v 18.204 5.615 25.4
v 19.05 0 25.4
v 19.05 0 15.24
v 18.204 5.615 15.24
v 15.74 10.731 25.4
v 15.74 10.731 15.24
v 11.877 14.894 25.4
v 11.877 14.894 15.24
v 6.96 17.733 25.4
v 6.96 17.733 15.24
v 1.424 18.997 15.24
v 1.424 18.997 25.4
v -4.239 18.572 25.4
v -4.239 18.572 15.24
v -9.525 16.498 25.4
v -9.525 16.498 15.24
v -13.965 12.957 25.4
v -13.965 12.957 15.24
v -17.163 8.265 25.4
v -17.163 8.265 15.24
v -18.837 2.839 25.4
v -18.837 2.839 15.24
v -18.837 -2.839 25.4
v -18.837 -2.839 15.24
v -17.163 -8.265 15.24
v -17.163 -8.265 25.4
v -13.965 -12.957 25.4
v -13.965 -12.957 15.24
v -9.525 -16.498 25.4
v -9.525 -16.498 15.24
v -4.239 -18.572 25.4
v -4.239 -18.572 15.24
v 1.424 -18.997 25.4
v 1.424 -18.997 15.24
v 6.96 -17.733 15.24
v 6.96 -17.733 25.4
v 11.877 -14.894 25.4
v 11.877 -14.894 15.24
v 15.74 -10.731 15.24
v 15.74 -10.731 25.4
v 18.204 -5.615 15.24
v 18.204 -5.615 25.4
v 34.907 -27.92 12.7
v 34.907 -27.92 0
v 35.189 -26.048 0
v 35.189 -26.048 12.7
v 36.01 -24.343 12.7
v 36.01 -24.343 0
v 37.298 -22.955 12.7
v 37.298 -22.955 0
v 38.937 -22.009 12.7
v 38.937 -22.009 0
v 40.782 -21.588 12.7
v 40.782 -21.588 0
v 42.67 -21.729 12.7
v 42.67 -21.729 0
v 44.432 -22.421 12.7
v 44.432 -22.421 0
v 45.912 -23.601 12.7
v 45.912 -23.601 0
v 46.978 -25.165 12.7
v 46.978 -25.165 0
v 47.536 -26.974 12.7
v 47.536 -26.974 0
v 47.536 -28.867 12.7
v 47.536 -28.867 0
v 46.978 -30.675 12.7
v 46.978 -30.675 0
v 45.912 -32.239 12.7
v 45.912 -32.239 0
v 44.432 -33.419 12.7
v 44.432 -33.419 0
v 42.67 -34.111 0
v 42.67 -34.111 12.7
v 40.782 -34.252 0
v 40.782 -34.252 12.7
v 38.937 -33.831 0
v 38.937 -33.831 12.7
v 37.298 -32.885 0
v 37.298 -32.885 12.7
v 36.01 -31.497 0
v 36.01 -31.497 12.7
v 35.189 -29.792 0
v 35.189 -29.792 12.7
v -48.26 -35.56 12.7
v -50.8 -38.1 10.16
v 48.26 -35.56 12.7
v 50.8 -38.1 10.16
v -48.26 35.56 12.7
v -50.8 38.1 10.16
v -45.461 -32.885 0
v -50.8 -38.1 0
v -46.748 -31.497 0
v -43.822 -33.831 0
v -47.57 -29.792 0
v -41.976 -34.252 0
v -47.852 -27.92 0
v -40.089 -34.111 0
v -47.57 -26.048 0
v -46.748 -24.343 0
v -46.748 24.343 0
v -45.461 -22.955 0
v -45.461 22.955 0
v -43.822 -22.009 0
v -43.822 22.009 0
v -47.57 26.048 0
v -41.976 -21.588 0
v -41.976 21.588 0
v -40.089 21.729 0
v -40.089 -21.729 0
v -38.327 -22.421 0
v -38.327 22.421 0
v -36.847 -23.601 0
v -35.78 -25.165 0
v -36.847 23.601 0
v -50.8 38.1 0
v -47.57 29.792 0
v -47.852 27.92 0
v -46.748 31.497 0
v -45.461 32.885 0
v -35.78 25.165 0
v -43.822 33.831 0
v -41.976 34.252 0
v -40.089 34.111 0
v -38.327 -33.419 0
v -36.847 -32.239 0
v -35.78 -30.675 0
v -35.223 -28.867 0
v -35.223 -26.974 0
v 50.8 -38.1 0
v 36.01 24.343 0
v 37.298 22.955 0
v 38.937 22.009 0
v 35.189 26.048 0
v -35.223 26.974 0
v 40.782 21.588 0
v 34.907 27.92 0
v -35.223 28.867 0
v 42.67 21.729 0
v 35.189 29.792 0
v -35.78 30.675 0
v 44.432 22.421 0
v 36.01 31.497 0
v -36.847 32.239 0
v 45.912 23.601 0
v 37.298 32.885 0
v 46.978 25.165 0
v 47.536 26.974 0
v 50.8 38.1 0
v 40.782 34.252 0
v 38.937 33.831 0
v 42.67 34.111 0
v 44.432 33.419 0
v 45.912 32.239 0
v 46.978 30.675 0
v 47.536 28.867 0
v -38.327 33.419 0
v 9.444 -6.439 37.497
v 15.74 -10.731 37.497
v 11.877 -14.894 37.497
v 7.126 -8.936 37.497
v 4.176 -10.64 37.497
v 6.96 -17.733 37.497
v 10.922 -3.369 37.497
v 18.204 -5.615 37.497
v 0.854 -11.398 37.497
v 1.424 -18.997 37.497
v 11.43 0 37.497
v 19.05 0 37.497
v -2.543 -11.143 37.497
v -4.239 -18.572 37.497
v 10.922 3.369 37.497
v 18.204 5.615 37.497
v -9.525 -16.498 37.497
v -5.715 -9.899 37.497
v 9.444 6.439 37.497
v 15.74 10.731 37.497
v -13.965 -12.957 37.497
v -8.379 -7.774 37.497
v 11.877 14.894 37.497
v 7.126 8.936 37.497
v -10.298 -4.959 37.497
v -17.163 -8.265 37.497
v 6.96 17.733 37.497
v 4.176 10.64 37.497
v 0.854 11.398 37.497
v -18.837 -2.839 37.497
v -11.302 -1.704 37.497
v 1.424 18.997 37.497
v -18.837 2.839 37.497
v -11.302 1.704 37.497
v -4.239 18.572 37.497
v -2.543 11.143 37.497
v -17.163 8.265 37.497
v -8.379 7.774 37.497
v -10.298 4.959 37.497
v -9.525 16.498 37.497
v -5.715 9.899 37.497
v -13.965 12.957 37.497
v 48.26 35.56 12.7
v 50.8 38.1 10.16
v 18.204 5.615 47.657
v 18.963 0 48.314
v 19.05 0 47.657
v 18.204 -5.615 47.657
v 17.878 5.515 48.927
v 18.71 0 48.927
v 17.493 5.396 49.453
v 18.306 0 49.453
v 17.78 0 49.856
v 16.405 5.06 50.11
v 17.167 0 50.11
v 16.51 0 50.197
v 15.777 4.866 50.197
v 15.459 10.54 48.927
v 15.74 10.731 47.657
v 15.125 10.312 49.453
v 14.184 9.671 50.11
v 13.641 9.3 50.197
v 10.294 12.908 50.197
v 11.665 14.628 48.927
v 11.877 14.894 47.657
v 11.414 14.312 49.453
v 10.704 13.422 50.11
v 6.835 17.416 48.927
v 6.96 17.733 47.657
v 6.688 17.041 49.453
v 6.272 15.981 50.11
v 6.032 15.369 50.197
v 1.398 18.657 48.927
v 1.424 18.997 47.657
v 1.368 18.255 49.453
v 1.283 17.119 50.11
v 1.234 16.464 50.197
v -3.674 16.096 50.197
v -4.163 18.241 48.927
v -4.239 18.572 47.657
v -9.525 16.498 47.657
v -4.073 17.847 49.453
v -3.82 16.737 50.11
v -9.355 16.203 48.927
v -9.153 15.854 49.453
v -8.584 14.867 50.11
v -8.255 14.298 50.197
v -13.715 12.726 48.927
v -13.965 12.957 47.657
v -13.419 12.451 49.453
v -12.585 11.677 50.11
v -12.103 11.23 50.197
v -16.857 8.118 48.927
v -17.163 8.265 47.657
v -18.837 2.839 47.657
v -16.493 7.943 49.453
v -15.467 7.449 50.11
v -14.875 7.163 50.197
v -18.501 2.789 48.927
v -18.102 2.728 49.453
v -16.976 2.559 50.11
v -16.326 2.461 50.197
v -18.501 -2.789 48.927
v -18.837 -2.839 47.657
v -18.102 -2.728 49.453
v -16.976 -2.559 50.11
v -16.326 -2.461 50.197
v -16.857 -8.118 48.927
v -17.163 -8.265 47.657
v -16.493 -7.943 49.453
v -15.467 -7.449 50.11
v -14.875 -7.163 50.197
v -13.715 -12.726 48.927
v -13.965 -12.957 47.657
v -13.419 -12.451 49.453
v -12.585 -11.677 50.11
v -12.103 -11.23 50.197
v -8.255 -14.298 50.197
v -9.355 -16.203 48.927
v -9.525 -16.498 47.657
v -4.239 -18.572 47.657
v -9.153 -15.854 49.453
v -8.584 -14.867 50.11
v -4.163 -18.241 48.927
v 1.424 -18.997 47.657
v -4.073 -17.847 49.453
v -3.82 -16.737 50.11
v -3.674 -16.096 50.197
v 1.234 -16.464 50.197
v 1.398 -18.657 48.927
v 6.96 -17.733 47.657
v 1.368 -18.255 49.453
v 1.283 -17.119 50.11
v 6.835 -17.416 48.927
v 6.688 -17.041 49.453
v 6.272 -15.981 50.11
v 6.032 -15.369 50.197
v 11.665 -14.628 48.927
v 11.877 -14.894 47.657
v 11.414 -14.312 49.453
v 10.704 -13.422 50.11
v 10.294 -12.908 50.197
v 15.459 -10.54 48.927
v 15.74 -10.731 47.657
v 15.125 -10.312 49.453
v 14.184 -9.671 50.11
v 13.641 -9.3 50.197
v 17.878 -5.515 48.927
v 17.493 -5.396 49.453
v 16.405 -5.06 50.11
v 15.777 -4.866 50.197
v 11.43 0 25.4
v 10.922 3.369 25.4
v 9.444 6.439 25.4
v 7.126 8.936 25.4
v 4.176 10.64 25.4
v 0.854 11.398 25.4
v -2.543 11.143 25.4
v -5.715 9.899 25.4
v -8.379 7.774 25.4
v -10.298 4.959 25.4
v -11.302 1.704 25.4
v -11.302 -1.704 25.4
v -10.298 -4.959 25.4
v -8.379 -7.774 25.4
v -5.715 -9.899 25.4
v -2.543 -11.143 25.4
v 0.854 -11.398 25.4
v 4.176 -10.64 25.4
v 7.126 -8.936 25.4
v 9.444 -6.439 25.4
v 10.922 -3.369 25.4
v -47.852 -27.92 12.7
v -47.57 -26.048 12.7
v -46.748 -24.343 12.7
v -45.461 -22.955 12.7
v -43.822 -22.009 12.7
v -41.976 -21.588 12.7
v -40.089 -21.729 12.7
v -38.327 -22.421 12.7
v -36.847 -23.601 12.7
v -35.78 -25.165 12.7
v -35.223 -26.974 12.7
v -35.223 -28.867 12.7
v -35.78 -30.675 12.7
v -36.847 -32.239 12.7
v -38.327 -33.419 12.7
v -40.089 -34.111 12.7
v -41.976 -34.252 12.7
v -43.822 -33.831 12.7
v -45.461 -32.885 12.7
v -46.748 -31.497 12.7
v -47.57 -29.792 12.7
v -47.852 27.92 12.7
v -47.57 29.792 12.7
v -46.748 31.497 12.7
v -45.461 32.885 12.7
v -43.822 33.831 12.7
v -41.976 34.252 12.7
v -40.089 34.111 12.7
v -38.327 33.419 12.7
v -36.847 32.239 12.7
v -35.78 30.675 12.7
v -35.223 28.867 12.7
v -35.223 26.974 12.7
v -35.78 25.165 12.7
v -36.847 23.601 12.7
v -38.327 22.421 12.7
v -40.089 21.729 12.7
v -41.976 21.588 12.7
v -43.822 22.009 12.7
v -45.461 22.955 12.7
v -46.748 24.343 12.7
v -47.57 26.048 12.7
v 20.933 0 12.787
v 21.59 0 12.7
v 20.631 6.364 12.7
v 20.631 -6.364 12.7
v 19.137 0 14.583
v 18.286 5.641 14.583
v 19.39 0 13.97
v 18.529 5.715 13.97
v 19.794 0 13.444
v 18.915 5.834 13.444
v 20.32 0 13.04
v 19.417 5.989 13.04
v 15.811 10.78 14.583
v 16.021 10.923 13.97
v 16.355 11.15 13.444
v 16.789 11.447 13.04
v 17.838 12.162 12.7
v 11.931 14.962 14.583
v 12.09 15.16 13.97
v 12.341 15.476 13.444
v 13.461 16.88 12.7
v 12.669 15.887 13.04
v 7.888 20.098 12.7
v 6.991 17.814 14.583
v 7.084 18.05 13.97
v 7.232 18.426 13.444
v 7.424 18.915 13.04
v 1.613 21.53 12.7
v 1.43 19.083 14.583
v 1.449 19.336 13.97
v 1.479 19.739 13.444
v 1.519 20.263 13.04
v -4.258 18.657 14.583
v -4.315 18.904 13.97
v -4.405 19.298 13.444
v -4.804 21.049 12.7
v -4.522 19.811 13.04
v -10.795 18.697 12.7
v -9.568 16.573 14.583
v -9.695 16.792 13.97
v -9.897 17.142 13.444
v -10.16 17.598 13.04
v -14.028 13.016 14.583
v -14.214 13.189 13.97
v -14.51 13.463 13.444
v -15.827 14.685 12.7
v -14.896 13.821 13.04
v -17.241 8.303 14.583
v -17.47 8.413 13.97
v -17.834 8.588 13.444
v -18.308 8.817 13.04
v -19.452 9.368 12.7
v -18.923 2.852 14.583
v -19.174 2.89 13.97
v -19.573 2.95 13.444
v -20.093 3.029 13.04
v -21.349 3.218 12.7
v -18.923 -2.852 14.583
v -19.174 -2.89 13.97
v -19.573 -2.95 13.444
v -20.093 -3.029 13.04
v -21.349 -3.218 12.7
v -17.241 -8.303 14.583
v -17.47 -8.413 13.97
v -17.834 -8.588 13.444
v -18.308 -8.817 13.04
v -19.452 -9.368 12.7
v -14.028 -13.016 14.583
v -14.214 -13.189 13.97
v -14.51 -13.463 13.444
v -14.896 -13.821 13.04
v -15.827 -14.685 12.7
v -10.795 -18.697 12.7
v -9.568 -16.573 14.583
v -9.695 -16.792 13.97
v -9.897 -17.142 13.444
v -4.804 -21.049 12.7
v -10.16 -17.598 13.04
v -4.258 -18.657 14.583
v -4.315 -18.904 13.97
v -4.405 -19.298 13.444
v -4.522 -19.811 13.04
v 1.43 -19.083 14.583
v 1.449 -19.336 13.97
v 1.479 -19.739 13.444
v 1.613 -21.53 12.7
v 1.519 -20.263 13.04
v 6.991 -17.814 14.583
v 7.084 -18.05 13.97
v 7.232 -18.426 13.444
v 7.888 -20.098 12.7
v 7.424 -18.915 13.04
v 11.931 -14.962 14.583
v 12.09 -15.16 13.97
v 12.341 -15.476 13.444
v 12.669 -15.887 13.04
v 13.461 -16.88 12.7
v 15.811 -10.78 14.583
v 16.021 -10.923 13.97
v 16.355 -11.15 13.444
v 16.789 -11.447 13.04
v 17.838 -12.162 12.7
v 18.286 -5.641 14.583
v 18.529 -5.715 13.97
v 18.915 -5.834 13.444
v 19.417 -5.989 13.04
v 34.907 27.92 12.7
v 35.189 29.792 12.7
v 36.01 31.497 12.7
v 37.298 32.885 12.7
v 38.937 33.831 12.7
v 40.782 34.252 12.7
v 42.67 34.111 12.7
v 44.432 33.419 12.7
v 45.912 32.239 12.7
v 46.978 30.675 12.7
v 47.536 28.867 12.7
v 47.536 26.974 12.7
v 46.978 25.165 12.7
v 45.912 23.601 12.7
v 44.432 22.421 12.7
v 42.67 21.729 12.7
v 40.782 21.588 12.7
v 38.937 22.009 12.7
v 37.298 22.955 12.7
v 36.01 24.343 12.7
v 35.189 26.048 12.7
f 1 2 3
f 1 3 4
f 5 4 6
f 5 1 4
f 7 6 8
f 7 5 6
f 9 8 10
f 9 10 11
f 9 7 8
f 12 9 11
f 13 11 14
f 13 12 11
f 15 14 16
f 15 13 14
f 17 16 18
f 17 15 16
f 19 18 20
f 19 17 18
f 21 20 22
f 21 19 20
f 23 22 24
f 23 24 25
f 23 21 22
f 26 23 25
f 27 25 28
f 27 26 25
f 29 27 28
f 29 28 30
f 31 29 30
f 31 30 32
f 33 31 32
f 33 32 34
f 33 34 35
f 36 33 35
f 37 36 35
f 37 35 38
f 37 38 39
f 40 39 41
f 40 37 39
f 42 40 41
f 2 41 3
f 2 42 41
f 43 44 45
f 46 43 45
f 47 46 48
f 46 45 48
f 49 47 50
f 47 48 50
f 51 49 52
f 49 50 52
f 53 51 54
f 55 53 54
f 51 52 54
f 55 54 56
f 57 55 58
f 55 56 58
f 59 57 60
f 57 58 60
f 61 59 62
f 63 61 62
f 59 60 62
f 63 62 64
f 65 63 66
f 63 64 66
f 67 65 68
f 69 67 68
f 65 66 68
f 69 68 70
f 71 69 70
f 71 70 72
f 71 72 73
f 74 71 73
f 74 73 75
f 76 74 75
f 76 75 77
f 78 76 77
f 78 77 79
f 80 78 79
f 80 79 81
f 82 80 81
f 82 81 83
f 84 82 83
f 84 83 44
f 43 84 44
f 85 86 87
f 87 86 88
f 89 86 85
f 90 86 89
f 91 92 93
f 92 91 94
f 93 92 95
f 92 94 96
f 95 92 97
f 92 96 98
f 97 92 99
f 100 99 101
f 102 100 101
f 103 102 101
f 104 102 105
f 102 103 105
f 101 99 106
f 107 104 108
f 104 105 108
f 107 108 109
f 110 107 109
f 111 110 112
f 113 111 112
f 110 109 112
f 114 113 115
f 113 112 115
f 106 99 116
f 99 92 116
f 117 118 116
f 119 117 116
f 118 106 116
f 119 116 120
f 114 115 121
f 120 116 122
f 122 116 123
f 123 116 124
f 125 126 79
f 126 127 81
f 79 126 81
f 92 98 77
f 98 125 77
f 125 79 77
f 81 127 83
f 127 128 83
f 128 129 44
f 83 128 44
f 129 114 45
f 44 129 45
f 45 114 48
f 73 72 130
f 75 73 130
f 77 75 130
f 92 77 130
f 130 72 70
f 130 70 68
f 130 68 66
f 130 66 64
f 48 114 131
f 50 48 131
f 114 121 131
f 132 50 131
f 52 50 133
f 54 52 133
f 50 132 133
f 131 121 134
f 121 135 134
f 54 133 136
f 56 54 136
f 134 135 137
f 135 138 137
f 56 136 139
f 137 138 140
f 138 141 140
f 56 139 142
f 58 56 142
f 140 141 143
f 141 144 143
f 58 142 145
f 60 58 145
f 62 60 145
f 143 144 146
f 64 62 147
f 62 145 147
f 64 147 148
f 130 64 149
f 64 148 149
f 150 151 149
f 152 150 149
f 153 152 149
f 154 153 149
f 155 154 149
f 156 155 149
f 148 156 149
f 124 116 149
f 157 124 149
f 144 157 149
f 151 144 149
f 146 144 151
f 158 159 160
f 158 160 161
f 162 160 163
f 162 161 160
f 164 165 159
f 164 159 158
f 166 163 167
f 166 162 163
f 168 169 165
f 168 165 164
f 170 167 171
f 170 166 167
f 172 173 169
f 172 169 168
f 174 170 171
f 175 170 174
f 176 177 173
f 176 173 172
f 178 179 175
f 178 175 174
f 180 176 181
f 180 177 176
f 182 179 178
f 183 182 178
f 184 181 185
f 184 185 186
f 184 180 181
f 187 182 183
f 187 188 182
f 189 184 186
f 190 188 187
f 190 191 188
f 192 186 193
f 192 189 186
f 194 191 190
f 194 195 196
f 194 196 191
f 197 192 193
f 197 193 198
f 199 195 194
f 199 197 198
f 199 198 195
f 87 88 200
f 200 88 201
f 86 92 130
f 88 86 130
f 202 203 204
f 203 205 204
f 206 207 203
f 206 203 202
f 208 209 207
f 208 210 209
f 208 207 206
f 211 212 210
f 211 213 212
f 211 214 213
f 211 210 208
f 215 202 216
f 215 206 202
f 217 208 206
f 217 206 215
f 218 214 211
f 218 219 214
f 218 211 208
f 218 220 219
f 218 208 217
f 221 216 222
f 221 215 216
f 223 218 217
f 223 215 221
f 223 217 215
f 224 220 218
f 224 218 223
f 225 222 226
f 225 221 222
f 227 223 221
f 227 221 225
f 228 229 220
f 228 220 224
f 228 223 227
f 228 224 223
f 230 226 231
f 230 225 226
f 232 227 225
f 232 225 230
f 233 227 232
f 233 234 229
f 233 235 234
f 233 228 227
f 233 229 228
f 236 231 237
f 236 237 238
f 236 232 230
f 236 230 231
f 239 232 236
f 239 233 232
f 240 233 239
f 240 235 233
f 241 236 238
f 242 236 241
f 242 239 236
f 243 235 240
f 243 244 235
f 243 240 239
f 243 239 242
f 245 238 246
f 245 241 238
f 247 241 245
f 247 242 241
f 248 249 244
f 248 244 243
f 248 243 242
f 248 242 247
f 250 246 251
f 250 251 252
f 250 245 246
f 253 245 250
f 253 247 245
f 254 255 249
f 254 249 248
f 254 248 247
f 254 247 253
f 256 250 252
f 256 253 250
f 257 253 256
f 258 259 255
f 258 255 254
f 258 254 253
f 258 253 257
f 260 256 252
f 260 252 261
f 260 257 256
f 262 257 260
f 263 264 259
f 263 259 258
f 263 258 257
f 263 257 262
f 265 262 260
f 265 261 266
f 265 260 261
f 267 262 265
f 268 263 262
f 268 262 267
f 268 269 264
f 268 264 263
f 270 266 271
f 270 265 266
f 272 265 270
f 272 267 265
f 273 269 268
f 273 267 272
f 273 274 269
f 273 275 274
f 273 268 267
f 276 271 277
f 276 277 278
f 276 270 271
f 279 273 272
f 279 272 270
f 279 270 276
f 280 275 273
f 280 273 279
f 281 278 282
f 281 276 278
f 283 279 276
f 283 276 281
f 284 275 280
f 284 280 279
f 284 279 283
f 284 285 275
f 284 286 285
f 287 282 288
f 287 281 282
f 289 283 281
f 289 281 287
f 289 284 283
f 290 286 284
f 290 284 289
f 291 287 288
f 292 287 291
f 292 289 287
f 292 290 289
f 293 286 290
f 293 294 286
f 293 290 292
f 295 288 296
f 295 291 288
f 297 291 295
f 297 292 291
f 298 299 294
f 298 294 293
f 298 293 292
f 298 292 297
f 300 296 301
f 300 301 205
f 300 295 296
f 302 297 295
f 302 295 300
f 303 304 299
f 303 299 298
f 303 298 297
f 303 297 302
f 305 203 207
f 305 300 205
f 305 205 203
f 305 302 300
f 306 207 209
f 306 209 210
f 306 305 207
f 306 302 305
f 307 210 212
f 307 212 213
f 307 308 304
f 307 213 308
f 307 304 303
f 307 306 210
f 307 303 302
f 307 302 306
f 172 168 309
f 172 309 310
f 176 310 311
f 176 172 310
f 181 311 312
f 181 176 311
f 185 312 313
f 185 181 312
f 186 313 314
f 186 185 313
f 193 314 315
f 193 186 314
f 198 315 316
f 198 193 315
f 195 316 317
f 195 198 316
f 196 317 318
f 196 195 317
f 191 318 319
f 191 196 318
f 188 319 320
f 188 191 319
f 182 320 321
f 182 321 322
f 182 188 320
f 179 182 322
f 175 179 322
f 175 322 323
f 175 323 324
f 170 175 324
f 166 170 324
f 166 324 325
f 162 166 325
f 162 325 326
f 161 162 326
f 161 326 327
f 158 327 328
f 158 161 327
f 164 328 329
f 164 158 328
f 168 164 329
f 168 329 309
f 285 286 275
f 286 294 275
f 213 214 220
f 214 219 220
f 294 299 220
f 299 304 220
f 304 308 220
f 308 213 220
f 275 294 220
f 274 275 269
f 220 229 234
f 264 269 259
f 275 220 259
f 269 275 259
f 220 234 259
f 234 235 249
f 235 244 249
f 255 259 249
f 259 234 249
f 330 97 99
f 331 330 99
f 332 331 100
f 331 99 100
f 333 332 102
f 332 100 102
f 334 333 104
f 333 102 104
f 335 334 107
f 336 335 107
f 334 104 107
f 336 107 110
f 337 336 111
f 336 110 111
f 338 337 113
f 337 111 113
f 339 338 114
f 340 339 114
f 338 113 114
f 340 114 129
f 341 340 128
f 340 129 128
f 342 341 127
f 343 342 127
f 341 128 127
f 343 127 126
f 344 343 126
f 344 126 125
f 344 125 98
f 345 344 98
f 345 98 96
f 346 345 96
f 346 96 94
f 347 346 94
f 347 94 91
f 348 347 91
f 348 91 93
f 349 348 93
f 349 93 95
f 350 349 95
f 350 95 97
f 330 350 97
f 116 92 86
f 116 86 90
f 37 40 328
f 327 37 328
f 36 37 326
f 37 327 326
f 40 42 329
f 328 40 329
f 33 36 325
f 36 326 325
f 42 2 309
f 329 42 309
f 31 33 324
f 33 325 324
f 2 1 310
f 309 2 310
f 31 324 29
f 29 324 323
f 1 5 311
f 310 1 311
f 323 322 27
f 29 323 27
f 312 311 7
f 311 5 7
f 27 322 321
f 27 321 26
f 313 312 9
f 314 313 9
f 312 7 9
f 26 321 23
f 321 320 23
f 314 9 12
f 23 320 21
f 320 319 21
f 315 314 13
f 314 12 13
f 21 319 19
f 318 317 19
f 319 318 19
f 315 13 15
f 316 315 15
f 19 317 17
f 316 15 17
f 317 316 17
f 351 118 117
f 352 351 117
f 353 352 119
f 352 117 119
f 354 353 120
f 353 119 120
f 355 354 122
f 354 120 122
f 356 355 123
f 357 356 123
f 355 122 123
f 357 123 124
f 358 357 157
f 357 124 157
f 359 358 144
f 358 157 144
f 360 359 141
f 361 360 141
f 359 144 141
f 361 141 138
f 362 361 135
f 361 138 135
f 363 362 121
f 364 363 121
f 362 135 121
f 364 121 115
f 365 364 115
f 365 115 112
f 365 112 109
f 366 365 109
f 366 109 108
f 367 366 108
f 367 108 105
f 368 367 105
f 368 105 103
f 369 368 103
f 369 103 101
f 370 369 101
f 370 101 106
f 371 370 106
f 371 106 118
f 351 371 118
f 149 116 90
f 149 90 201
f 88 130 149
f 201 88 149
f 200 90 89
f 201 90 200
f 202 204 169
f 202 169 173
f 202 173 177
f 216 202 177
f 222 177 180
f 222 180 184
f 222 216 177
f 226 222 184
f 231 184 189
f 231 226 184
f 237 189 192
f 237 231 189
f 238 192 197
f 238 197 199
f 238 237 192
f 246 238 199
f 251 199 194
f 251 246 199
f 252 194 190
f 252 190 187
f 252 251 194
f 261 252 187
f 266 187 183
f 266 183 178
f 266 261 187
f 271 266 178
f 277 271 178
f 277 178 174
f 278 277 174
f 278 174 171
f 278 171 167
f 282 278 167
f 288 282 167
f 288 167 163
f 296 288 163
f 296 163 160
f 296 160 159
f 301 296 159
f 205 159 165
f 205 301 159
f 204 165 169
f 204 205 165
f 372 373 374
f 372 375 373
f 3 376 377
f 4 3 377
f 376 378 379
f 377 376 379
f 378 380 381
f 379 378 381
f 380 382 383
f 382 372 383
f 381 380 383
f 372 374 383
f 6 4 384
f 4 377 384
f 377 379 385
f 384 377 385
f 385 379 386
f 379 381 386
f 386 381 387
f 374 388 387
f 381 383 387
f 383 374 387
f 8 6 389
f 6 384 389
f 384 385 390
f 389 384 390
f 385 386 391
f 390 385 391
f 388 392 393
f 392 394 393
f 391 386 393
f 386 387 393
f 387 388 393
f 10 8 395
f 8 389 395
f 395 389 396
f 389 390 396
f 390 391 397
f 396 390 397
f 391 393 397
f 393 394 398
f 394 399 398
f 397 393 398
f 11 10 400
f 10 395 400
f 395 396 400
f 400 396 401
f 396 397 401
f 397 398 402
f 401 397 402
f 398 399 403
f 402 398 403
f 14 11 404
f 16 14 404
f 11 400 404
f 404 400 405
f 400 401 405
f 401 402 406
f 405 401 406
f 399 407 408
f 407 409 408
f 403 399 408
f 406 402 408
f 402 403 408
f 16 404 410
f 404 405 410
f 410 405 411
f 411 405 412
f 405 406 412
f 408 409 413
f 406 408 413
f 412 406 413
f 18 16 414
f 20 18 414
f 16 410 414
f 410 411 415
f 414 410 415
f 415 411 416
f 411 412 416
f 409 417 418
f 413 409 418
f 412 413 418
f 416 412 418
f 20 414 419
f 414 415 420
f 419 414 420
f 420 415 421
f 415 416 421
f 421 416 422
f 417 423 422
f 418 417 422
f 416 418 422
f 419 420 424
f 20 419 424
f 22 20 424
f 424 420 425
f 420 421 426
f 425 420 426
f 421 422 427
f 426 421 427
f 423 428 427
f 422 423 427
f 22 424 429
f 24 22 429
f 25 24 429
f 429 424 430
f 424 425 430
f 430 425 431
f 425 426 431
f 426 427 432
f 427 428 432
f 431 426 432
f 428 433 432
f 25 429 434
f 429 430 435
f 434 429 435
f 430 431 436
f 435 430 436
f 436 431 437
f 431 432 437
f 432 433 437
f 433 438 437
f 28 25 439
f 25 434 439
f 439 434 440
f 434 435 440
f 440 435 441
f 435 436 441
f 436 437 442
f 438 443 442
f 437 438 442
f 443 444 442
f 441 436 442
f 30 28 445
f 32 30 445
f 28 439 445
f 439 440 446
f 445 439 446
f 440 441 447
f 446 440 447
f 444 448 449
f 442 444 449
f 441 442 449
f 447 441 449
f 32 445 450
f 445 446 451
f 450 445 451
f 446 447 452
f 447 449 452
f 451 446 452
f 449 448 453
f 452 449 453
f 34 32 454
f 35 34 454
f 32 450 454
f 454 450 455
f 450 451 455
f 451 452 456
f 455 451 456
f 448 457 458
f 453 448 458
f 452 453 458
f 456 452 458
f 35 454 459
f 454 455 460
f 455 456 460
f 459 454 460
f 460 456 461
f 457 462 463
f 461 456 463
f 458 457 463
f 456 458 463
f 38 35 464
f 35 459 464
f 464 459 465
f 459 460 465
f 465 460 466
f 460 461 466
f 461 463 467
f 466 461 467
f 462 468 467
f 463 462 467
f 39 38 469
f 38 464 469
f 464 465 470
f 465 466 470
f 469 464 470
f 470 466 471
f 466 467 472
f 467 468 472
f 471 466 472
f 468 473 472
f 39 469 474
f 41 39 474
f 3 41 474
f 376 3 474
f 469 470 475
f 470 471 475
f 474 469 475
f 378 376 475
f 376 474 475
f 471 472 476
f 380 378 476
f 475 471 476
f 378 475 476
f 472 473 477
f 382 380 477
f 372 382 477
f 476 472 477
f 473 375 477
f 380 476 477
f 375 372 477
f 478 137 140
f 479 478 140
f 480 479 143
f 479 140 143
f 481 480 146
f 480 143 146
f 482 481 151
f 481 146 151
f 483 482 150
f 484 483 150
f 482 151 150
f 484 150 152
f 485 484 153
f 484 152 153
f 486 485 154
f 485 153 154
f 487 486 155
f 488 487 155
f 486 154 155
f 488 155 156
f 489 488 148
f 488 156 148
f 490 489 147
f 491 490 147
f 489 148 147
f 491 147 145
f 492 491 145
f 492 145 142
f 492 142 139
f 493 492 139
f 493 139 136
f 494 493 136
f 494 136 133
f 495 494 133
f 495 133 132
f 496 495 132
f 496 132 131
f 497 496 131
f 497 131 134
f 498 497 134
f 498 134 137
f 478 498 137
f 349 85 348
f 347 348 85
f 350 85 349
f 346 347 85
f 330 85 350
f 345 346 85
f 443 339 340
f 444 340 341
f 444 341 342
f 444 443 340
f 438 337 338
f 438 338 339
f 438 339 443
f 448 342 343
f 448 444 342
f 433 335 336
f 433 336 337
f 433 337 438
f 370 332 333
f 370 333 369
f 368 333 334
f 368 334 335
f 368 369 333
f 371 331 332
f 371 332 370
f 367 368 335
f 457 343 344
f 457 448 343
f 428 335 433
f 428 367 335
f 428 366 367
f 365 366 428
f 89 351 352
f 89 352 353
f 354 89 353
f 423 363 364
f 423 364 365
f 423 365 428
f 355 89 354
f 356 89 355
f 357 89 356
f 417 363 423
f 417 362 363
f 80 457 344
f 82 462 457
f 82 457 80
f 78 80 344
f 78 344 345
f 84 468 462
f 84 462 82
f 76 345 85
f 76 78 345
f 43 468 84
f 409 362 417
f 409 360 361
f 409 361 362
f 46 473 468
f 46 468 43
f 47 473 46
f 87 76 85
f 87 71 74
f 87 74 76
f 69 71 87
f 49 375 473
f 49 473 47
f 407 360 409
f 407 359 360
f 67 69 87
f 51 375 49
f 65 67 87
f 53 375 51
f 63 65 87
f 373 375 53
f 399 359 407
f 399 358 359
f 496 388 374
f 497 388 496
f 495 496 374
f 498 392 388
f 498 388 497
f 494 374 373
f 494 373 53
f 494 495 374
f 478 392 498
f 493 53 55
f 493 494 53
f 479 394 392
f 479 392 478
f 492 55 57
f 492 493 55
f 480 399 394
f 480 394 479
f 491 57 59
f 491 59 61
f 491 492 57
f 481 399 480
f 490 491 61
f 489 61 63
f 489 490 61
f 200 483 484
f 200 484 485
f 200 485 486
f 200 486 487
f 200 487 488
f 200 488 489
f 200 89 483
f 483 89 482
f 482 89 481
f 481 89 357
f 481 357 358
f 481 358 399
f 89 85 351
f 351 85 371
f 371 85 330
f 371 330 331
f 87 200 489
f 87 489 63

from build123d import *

# Parameters (mm, degrees)
F0_W     = 101.6
F0_H     = 76.2
F1_DEPTH = 12.7
F4_D     = 12.7
F5_W     = 11.43
F5_H     = 31.75
F7_W     = 19.05
F7_H     = 12.7
F9_W     = 19.05
F9_H     = 12.7
F11_R    = 2.54
F12_SIZE = 2.54


with BuildPart() as f1:
    # F0 (on Top) → F1 (new body)
    with BuildSketch(Plane.XY):
        Rectangle(F0_W, F0_H)
    extrude(amount=F1_DEPTH)

    # F4 (through all)
    with Locations(Plane.XY.offset(12.7)):
        with Locations((-41.501624, 27.920099), (41.256946, 27.920099), (41.256946, -27.920099), (-41.501624, -27.920099)):
            Hole(F4_D / 2)

    # F5 (on Front) → F6 (revolve)
    with BuildSketch(Plane.XZ):
        with Locations((5.715, 28.575)):
            Rectangle(F5_W, F5_H)
    revolve(axis=Axis((0, 0, 28.575), (0, 0, 1)))

    # F7 (on Front) → F8 (revolve)
    with BuildSketch(Plane.XZ):
        with Locations((9.525, 19.05)):
            Rectangle(F7_W, F7_H)
    revolve(axis=Axis((0, 0, 19.05), (0, 0, 1)))

    # F9 (on Front) → F10 (revolve)
    with BuildSketch(Plane.XZ):
        with Locations((9.525, 43.846787)):
            Rectangle(F9_W, F9_H)
    revolve(axis=Axis((0, 0, 43.846787), (0, 0, 1)))

    # F11
    f11_edges = [f1.edges().sort_by_distance(p)[0] for p in [
        (-19.05, 0, 50.196787),
        (-19.05, 0, 12.7),
    ]]
    fillet(f11_edges, radius=F11_R)

    # F12
    f12_edges = [f1.edges().sort_by_distance(p)[0] for p in [
        (0, 38.1, 12.7),
        (50.8, 0, 12.7),
        (0, -38.1, 12.7),
        (-50.8, 0, 12.7),
    ]]
    chamfer(f12_edges, length=F12_SIZE)


solid = f1.part
